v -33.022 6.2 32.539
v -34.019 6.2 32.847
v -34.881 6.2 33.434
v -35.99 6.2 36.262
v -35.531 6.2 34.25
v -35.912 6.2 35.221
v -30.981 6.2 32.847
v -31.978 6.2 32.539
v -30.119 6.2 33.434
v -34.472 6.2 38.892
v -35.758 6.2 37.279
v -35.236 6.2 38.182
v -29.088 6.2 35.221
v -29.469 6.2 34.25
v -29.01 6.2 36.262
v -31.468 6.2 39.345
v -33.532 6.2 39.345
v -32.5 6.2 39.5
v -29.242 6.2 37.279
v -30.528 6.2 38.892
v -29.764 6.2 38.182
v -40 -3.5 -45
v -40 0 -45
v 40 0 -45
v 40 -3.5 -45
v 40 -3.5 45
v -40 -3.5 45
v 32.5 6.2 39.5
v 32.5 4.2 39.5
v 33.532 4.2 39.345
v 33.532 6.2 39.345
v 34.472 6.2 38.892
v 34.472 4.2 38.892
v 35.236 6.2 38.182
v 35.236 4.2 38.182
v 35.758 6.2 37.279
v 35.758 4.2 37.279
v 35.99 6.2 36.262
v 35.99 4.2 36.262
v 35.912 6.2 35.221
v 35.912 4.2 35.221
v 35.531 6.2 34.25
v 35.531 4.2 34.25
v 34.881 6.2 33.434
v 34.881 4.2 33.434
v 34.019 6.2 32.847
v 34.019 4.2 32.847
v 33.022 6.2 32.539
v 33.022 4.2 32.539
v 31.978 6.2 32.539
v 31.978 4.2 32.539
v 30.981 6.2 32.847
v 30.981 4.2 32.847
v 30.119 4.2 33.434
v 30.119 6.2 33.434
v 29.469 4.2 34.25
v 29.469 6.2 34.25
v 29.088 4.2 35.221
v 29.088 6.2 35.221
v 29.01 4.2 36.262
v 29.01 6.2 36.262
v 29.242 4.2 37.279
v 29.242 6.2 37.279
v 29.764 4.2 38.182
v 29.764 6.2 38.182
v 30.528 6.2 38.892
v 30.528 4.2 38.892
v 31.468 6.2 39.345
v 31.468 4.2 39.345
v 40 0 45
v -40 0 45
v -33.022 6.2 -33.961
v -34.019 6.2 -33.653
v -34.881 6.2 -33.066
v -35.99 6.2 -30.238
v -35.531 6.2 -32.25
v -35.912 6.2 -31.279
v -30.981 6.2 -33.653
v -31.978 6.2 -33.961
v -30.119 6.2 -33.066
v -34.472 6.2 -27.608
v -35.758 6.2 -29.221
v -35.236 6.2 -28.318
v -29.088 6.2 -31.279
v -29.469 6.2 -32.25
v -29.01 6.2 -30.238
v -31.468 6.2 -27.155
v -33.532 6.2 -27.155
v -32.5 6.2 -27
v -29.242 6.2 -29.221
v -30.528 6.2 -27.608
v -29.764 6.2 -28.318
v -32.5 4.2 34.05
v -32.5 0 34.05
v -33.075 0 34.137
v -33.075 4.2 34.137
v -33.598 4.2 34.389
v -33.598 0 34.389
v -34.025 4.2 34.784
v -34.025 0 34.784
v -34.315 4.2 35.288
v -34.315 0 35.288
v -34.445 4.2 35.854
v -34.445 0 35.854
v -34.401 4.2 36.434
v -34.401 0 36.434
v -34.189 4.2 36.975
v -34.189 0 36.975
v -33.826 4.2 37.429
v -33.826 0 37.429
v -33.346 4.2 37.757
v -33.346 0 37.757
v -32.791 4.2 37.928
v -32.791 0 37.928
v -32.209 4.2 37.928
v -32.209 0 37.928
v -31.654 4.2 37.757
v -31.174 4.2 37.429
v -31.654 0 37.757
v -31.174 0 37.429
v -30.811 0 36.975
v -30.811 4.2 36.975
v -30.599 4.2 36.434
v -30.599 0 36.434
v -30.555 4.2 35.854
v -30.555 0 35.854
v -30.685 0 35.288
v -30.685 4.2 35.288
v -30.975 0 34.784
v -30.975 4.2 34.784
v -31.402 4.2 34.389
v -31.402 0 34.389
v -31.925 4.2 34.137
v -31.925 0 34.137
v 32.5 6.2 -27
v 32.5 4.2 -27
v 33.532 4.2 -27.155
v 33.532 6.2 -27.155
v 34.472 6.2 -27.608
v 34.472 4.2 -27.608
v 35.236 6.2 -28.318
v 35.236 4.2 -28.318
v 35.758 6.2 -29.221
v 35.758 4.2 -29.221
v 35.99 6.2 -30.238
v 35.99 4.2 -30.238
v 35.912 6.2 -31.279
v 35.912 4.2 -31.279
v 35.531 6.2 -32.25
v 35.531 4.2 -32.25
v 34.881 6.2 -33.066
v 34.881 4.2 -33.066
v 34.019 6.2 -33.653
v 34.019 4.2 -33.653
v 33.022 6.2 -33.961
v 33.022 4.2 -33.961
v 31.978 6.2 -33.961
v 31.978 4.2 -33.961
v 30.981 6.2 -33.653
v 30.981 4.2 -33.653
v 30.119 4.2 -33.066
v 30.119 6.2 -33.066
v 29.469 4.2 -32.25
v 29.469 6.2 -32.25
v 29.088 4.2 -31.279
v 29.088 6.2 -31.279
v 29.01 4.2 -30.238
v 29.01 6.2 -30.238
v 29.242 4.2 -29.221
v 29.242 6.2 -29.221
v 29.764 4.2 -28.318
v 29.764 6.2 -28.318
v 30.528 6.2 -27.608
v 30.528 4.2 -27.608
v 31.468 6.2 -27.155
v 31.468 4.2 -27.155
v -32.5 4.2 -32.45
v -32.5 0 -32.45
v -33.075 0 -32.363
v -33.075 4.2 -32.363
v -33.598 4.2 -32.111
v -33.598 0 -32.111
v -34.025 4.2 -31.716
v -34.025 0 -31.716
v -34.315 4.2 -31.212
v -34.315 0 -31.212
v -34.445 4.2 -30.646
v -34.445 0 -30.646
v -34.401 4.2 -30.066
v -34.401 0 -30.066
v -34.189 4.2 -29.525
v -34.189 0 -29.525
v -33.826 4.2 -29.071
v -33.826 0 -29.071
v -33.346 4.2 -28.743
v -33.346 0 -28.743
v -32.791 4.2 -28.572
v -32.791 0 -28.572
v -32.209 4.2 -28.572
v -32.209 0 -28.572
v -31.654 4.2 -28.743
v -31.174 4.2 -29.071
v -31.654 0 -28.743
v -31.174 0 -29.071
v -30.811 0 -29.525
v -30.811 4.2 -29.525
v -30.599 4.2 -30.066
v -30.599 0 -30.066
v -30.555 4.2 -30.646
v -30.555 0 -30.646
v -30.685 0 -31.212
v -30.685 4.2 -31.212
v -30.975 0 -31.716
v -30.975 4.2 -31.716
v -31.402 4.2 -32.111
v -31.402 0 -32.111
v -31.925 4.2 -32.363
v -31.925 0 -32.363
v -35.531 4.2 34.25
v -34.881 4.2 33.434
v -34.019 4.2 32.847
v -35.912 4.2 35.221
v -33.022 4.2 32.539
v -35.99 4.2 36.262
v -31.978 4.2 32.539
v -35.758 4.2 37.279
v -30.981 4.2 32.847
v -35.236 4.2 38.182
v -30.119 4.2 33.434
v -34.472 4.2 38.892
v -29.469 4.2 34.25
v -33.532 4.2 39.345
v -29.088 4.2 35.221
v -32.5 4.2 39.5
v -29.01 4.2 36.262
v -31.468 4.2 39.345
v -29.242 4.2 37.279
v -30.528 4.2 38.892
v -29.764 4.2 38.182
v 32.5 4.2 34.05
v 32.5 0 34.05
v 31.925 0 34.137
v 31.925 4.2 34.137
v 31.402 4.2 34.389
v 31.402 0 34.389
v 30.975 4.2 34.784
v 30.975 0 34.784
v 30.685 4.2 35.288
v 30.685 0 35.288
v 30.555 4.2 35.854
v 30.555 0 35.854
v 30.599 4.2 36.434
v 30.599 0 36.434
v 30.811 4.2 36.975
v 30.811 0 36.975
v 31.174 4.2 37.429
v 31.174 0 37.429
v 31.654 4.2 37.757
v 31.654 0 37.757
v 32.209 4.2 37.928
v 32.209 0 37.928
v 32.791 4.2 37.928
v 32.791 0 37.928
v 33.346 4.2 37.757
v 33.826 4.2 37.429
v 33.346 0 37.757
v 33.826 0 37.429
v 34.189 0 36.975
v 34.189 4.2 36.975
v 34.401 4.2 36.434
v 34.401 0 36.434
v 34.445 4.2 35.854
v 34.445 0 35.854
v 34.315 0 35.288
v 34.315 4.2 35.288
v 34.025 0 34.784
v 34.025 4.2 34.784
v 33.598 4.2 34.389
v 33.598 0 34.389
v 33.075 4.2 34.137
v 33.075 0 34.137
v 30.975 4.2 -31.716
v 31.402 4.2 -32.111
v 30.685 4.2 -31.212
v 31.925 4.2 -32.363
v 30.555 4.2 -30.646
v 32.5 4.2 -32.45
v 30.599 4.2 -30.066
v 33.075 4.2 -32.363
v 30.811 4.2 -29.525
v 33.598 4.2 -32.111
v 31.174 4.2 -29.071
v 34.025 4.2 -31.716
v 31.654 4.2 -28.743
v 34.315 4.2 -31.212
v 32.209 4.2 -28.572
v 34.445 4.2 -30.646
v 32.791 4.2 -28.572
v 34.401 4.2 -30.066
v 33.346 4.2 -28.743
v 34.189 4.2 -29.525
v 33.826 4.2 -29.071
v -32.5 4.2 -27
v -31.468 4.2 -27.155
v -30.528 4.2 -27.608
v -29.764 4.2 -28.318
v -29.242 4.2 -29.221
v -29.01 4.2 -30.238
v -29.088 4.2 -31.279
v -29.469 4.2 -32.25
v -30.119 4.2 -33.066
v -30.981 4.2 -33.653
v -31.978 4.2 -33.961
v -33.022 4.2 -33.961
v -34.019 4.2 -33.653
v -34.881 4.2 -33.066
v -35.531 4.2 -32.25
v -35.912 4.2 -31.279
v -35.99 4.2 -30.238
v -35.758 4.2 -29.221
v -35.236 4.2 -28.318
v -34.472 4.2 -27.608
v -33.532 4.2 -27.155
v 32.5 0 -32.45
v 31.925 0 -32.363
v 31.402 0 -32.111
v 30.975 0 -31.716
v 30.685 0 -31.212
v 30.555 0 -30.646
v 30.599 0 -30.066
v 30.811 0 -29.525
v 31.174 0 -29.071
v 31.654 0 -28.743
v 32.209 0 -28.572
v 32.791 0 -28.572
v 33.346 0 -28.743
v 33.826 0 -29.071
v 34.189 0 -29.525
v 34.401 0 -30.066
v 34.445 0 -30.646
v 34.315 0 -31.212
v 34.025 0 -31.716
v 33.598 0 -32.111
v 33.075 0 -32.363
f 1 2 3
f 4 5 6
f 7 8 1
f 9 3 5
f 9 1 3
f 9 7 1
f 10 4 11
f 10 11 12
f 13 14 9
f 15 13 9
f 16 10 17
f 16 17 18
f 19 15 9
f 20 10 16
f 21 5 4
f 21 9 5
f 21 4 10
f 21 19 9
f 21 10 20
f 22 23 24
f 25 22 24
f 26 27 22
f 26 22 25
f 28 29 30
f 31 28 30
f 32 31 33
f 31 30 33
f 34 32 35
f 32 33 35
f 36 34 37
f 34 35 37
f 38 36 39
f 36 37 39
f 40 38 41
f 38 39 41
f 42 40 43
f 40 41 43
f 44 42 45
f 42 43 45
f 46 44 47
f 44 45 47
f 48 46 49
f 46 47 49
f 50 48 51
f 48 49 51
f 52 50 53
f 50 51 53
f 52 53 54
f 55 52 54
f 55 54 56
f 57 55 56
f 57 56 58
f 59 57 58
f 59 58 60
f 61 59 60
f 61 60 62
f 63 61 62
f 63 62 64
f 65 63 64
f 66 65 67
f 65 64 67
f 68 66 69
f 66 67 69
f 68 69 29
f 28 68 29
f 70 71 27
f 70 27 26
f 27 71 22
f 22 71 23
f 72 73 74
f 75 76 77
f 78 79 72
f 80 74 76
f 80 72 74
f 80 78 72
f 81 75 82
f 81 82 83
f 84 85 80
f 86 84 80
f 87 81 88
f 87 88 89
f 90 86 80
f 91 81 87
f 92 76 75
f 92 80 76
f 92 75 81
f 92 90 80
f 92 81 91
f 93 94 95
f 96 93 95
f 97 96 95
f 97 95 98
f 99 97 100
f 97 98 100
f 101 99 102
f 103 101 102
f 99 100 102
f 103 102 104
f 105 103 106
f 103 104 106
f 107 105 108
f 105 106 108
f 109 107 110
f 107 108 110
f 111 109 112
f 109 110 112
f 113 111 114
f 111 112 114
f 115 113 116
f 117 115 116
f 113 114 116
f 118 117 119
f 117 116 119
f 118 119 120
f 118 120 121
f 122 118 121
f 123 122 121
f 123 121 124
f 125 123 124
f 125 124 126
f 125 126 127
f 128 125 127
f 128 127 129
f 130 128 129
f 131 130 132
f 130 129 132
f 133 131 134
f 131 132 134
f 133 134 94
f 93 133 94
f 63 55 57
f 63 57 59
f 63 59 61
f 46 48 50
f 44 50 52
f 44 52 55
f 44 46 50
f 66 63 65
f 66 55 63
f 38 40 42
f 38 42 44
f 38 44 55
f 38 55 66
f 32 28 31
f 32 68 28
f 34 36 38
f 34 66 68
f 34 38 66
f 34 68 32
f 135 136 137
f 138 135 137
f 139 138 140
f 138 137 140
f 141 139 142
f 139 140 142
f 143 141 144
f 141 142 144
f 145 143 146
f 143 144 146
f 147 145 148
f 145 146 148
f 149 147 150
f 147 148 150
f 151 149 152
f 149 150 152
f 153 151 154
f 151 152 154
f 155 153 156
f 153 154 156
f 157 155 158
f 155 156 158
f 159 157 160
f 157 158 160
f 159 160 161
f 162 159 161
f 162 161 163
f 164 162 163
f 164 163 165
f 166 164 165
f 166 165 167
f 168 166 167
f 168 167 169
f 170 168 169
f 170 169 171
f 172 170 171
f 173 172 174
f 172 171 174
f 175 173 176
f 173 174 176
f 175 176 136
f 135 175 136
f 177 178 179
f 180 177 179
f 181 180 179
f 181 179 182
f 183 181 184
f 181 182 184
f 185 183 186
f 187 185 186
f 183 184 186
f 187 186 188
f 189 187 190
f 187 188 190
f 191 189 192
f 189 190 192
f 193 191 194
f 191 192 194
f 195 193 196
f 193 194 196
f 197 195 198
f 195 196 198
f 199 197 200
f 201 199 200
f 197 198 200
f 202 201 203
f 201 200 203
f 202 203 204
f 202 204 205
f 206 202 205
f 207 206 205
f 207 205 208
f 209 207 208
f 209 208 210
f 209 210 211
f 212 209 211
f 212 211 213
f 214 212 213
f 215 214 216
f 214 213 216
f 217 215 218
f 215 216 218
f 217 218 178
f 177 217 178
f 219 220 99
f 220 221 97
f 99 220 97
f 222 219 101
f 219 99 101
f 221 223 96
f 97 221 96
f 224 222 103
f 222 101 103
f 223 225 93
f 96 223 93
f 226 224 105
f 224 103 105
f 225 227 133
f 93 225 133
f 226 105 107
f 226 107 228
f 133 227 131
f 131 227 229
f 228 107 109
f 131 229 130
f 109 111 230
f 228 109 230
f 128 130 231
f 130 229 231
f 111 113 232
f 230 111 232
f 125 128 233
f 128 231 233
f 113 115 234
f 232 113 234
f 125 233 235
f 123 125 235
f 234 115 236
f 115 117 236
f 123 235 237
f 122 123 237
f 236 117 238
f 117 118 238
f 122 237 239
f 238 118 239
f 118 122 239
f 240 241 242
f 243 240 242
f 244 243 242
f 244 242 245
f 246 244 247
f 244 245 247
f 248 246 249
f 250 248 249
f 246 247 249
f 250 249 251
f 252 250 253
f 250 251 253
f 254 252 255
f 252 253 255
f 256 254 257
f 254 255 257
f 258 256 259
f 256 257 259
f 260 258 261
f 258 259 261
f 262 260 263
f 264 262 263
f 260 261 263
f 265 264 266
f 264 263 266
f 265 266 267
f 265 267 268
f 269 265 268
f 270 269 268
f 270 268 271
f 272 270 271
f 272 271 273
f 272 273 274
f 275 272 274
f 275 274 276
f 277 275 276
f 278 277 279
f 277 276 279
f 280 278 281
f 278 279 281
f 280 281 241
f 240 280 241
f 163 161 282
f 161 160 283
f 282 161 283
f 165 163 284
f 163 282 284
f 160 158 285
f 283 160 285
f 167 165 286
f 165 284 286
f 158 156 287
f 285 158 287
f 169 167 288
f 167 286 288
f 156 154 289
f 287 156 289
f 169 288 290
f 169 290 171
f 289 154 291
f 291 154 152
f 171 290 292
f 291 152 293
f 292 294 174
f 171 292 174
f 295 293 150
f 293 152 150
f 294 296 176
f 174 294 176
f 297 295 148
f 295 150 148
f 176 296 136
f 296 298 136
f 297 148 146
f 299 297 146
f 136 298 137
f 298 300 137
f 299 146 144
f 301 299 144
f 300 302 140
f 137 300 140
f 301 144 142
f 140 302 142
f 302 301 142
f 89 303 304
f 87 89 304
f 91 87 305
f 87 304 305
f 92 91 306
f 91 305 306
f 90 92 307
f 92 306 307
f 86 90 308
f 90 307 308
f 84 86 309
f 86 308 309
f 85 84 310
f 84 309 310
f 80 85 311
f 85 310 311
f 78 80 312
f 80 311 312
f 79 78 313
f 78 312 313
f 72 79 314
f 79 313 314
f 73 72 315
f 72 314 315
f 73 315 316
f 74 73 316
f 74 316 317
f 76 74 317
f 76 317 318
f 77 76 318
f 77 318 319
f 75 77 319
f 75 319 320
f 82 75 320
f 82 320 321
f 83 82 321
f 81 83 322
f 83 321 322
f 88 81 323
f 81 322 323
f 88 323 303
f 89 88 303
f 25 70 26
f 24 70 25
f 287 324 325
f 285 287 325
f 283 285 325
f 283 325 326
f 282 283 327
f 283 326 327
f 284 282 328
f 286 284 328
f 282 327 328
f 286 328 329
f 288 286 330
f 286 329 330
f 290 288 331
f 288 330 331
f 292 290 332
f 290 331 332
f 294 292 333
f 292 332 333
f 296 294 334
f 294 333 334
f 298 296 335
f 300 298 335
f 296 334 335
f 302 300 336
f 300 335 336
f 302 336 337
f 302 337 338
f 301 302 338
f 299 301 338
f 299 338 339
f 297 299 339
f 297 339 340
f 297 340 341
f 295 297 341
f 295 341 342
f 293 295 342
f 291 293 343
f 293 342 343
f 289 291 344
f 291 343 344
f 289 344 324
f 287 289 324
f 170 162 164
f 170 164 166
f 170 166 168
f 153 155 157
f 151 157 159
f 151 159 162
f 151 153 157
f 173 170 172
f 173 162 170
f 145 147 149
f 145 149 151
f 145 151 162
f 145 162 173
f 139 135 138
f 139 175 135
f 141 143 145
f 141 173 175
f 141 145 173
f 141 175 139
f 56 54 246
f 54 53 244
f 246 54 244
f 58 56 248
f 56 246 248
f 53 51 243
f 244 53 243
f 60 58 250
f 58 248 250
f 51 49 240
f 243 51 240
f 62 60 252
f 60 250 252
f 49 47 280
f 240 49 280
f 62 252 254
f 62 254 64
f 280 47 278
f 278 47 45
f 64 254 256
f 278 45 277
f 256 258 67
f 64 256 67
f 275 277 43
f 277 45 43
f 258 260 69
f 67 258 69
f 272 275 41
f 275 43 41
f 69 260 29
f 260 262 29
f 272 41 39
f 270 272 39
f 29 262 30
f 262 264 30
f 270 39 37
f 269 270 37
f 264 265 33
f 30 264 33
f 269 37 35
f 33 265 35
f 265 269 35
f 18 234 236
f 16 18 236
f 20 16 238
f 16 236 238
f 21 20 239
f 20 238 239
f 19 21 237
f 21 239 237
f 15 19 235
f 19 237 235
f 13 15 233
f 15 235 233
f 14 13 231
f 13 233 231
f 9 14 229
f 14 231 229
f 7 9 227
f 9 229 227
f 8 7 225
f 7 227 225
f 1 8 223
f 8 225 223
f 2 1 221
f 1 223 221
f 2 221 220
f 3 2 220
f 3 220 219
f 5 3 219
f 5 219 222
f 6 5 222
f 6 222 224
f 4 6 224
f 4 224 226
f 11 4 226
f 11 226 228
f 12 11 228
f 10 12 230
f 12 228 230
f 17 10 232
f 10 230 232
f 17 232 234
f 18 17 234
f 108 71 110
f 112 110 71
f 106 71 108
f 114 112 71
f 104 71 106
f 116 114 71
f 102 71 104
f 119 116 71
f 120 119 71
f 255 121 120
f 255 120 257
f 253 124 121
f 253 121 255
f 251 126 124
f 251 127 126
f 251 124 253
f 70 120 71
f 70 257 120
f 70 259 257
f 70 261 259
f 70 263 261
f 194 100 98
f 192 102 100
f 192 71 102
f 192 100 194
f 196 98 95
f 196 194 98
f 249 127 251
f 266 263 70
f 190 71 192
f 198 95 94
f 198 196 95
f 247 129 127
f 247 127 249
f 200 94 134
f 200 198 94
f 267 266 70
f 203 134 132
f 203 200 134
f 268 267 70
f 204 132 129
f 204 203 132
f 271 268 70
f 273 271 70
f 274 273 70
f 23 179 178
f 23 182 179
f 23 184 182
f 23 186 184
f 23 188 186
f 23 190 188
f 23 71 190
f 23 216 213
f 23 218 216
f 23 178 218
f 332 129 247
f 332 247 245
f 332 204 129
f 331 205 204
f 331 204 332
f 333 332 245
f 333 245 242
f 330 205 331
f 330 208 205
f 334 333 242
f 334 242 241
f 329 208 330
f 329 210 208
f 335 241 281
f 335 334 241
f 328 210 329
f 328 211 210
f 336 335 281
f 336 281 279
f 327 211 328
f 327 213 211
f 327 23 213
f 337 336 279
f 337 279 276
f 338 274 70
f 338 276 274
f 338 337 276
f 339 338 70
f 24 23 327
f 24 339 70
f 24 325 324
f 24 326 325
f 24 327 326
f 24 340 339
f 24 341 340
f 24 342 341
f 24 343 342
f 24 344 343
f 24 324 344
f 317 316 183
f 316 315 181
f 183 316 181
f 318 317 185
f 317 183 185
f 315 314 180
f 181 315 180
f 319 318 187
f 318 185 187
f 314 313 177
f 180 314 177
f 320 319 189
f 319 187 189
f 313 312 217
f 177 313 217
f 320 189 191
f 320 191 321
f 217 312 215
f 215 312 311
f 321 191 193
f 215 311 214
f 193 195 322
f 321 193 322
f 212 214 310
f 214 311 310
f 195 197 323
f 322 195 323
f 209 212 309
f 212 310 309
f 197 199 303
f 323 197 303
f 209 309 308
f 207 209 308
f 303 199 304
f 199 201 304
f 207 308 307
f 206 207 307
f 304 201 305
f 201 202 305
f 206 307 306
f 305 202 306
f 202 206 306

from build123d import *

# Parameters (mm, degrees)
SKETCH1_W           = 80
SKETCH1_H           = 90
BOSS_EXTRUDE1_DEPTH = 3.5
SKETCH2_R           = 1.95
BOSS_EXTRUDE2_DEPTH = 4.2
SKETCH3_R           = 3.5
BOSS_EXTRUDE3_DEPTH = 2


with BuildPart() as part:
    # Sketch1 → Boss-Extrude1 (new body)
    with BuildSketch(Plane(origin=(0, 0, 0), x_dir=(1, 0, 0), z_dir=(0, 1, 0))):
        Rectangle(SKETCH1_W, SKETCH1_H)
    extrude(amount=-BOSS_EXTRUDE1_DEPTH)

    # Sketch2 → Boss-Extrude2 (add)
    with BuildSketch(Plane(origin=(0, 0, 0), x_dir=(1, 0, 0), z_dir=(0, 1, 0))):
        with Locations(Location((-32.5, 30.5, 0), (0, 0, 90))):
            Circle(SKETCH2_R)
        with Locations(Location((32.5, 30.5, 0), (0, 0, 90))):
            Circle(SKETCH2_R)
        with Locations(Location((32.5, -36, 0), (0, 0, 90))):
            Circle(SKETCH2_R)
        with Locations(Location((-32.5, -36, 0), (0, 0, 90))):
            Circle(SKETCH2_R)
    extrude(amount=BOSS_EXTRUDE2_DEPTH)

    # Sketch3 → Boss-Extrude3 (add)
    with BuildSketch(Plane(origin=(0, 4.2, 0), x_dir=(1, 0, 0), z_dir=(0, 1, 0))):
        with Locations(Location((-32.5, 30.5, 0), (0, 0, 270))):
            Circle(SKETCH3_R)
        with Locations(Location((32.5, 30.5, 0), (0, 0, 270))):
            Circle(SKETCH3_R)
        with Locations(Location((-32.5, -36, 0), (0, 0, 270))):
            Circle(SKETCH3_R)
        with Locations(Location((32.5, -36, 0), (0, 0, 270))):
            Circle(SKETCH3_R)
    extrude(amount=BOSS_EXTRUDE3_DEPTH)


solid = part.part
